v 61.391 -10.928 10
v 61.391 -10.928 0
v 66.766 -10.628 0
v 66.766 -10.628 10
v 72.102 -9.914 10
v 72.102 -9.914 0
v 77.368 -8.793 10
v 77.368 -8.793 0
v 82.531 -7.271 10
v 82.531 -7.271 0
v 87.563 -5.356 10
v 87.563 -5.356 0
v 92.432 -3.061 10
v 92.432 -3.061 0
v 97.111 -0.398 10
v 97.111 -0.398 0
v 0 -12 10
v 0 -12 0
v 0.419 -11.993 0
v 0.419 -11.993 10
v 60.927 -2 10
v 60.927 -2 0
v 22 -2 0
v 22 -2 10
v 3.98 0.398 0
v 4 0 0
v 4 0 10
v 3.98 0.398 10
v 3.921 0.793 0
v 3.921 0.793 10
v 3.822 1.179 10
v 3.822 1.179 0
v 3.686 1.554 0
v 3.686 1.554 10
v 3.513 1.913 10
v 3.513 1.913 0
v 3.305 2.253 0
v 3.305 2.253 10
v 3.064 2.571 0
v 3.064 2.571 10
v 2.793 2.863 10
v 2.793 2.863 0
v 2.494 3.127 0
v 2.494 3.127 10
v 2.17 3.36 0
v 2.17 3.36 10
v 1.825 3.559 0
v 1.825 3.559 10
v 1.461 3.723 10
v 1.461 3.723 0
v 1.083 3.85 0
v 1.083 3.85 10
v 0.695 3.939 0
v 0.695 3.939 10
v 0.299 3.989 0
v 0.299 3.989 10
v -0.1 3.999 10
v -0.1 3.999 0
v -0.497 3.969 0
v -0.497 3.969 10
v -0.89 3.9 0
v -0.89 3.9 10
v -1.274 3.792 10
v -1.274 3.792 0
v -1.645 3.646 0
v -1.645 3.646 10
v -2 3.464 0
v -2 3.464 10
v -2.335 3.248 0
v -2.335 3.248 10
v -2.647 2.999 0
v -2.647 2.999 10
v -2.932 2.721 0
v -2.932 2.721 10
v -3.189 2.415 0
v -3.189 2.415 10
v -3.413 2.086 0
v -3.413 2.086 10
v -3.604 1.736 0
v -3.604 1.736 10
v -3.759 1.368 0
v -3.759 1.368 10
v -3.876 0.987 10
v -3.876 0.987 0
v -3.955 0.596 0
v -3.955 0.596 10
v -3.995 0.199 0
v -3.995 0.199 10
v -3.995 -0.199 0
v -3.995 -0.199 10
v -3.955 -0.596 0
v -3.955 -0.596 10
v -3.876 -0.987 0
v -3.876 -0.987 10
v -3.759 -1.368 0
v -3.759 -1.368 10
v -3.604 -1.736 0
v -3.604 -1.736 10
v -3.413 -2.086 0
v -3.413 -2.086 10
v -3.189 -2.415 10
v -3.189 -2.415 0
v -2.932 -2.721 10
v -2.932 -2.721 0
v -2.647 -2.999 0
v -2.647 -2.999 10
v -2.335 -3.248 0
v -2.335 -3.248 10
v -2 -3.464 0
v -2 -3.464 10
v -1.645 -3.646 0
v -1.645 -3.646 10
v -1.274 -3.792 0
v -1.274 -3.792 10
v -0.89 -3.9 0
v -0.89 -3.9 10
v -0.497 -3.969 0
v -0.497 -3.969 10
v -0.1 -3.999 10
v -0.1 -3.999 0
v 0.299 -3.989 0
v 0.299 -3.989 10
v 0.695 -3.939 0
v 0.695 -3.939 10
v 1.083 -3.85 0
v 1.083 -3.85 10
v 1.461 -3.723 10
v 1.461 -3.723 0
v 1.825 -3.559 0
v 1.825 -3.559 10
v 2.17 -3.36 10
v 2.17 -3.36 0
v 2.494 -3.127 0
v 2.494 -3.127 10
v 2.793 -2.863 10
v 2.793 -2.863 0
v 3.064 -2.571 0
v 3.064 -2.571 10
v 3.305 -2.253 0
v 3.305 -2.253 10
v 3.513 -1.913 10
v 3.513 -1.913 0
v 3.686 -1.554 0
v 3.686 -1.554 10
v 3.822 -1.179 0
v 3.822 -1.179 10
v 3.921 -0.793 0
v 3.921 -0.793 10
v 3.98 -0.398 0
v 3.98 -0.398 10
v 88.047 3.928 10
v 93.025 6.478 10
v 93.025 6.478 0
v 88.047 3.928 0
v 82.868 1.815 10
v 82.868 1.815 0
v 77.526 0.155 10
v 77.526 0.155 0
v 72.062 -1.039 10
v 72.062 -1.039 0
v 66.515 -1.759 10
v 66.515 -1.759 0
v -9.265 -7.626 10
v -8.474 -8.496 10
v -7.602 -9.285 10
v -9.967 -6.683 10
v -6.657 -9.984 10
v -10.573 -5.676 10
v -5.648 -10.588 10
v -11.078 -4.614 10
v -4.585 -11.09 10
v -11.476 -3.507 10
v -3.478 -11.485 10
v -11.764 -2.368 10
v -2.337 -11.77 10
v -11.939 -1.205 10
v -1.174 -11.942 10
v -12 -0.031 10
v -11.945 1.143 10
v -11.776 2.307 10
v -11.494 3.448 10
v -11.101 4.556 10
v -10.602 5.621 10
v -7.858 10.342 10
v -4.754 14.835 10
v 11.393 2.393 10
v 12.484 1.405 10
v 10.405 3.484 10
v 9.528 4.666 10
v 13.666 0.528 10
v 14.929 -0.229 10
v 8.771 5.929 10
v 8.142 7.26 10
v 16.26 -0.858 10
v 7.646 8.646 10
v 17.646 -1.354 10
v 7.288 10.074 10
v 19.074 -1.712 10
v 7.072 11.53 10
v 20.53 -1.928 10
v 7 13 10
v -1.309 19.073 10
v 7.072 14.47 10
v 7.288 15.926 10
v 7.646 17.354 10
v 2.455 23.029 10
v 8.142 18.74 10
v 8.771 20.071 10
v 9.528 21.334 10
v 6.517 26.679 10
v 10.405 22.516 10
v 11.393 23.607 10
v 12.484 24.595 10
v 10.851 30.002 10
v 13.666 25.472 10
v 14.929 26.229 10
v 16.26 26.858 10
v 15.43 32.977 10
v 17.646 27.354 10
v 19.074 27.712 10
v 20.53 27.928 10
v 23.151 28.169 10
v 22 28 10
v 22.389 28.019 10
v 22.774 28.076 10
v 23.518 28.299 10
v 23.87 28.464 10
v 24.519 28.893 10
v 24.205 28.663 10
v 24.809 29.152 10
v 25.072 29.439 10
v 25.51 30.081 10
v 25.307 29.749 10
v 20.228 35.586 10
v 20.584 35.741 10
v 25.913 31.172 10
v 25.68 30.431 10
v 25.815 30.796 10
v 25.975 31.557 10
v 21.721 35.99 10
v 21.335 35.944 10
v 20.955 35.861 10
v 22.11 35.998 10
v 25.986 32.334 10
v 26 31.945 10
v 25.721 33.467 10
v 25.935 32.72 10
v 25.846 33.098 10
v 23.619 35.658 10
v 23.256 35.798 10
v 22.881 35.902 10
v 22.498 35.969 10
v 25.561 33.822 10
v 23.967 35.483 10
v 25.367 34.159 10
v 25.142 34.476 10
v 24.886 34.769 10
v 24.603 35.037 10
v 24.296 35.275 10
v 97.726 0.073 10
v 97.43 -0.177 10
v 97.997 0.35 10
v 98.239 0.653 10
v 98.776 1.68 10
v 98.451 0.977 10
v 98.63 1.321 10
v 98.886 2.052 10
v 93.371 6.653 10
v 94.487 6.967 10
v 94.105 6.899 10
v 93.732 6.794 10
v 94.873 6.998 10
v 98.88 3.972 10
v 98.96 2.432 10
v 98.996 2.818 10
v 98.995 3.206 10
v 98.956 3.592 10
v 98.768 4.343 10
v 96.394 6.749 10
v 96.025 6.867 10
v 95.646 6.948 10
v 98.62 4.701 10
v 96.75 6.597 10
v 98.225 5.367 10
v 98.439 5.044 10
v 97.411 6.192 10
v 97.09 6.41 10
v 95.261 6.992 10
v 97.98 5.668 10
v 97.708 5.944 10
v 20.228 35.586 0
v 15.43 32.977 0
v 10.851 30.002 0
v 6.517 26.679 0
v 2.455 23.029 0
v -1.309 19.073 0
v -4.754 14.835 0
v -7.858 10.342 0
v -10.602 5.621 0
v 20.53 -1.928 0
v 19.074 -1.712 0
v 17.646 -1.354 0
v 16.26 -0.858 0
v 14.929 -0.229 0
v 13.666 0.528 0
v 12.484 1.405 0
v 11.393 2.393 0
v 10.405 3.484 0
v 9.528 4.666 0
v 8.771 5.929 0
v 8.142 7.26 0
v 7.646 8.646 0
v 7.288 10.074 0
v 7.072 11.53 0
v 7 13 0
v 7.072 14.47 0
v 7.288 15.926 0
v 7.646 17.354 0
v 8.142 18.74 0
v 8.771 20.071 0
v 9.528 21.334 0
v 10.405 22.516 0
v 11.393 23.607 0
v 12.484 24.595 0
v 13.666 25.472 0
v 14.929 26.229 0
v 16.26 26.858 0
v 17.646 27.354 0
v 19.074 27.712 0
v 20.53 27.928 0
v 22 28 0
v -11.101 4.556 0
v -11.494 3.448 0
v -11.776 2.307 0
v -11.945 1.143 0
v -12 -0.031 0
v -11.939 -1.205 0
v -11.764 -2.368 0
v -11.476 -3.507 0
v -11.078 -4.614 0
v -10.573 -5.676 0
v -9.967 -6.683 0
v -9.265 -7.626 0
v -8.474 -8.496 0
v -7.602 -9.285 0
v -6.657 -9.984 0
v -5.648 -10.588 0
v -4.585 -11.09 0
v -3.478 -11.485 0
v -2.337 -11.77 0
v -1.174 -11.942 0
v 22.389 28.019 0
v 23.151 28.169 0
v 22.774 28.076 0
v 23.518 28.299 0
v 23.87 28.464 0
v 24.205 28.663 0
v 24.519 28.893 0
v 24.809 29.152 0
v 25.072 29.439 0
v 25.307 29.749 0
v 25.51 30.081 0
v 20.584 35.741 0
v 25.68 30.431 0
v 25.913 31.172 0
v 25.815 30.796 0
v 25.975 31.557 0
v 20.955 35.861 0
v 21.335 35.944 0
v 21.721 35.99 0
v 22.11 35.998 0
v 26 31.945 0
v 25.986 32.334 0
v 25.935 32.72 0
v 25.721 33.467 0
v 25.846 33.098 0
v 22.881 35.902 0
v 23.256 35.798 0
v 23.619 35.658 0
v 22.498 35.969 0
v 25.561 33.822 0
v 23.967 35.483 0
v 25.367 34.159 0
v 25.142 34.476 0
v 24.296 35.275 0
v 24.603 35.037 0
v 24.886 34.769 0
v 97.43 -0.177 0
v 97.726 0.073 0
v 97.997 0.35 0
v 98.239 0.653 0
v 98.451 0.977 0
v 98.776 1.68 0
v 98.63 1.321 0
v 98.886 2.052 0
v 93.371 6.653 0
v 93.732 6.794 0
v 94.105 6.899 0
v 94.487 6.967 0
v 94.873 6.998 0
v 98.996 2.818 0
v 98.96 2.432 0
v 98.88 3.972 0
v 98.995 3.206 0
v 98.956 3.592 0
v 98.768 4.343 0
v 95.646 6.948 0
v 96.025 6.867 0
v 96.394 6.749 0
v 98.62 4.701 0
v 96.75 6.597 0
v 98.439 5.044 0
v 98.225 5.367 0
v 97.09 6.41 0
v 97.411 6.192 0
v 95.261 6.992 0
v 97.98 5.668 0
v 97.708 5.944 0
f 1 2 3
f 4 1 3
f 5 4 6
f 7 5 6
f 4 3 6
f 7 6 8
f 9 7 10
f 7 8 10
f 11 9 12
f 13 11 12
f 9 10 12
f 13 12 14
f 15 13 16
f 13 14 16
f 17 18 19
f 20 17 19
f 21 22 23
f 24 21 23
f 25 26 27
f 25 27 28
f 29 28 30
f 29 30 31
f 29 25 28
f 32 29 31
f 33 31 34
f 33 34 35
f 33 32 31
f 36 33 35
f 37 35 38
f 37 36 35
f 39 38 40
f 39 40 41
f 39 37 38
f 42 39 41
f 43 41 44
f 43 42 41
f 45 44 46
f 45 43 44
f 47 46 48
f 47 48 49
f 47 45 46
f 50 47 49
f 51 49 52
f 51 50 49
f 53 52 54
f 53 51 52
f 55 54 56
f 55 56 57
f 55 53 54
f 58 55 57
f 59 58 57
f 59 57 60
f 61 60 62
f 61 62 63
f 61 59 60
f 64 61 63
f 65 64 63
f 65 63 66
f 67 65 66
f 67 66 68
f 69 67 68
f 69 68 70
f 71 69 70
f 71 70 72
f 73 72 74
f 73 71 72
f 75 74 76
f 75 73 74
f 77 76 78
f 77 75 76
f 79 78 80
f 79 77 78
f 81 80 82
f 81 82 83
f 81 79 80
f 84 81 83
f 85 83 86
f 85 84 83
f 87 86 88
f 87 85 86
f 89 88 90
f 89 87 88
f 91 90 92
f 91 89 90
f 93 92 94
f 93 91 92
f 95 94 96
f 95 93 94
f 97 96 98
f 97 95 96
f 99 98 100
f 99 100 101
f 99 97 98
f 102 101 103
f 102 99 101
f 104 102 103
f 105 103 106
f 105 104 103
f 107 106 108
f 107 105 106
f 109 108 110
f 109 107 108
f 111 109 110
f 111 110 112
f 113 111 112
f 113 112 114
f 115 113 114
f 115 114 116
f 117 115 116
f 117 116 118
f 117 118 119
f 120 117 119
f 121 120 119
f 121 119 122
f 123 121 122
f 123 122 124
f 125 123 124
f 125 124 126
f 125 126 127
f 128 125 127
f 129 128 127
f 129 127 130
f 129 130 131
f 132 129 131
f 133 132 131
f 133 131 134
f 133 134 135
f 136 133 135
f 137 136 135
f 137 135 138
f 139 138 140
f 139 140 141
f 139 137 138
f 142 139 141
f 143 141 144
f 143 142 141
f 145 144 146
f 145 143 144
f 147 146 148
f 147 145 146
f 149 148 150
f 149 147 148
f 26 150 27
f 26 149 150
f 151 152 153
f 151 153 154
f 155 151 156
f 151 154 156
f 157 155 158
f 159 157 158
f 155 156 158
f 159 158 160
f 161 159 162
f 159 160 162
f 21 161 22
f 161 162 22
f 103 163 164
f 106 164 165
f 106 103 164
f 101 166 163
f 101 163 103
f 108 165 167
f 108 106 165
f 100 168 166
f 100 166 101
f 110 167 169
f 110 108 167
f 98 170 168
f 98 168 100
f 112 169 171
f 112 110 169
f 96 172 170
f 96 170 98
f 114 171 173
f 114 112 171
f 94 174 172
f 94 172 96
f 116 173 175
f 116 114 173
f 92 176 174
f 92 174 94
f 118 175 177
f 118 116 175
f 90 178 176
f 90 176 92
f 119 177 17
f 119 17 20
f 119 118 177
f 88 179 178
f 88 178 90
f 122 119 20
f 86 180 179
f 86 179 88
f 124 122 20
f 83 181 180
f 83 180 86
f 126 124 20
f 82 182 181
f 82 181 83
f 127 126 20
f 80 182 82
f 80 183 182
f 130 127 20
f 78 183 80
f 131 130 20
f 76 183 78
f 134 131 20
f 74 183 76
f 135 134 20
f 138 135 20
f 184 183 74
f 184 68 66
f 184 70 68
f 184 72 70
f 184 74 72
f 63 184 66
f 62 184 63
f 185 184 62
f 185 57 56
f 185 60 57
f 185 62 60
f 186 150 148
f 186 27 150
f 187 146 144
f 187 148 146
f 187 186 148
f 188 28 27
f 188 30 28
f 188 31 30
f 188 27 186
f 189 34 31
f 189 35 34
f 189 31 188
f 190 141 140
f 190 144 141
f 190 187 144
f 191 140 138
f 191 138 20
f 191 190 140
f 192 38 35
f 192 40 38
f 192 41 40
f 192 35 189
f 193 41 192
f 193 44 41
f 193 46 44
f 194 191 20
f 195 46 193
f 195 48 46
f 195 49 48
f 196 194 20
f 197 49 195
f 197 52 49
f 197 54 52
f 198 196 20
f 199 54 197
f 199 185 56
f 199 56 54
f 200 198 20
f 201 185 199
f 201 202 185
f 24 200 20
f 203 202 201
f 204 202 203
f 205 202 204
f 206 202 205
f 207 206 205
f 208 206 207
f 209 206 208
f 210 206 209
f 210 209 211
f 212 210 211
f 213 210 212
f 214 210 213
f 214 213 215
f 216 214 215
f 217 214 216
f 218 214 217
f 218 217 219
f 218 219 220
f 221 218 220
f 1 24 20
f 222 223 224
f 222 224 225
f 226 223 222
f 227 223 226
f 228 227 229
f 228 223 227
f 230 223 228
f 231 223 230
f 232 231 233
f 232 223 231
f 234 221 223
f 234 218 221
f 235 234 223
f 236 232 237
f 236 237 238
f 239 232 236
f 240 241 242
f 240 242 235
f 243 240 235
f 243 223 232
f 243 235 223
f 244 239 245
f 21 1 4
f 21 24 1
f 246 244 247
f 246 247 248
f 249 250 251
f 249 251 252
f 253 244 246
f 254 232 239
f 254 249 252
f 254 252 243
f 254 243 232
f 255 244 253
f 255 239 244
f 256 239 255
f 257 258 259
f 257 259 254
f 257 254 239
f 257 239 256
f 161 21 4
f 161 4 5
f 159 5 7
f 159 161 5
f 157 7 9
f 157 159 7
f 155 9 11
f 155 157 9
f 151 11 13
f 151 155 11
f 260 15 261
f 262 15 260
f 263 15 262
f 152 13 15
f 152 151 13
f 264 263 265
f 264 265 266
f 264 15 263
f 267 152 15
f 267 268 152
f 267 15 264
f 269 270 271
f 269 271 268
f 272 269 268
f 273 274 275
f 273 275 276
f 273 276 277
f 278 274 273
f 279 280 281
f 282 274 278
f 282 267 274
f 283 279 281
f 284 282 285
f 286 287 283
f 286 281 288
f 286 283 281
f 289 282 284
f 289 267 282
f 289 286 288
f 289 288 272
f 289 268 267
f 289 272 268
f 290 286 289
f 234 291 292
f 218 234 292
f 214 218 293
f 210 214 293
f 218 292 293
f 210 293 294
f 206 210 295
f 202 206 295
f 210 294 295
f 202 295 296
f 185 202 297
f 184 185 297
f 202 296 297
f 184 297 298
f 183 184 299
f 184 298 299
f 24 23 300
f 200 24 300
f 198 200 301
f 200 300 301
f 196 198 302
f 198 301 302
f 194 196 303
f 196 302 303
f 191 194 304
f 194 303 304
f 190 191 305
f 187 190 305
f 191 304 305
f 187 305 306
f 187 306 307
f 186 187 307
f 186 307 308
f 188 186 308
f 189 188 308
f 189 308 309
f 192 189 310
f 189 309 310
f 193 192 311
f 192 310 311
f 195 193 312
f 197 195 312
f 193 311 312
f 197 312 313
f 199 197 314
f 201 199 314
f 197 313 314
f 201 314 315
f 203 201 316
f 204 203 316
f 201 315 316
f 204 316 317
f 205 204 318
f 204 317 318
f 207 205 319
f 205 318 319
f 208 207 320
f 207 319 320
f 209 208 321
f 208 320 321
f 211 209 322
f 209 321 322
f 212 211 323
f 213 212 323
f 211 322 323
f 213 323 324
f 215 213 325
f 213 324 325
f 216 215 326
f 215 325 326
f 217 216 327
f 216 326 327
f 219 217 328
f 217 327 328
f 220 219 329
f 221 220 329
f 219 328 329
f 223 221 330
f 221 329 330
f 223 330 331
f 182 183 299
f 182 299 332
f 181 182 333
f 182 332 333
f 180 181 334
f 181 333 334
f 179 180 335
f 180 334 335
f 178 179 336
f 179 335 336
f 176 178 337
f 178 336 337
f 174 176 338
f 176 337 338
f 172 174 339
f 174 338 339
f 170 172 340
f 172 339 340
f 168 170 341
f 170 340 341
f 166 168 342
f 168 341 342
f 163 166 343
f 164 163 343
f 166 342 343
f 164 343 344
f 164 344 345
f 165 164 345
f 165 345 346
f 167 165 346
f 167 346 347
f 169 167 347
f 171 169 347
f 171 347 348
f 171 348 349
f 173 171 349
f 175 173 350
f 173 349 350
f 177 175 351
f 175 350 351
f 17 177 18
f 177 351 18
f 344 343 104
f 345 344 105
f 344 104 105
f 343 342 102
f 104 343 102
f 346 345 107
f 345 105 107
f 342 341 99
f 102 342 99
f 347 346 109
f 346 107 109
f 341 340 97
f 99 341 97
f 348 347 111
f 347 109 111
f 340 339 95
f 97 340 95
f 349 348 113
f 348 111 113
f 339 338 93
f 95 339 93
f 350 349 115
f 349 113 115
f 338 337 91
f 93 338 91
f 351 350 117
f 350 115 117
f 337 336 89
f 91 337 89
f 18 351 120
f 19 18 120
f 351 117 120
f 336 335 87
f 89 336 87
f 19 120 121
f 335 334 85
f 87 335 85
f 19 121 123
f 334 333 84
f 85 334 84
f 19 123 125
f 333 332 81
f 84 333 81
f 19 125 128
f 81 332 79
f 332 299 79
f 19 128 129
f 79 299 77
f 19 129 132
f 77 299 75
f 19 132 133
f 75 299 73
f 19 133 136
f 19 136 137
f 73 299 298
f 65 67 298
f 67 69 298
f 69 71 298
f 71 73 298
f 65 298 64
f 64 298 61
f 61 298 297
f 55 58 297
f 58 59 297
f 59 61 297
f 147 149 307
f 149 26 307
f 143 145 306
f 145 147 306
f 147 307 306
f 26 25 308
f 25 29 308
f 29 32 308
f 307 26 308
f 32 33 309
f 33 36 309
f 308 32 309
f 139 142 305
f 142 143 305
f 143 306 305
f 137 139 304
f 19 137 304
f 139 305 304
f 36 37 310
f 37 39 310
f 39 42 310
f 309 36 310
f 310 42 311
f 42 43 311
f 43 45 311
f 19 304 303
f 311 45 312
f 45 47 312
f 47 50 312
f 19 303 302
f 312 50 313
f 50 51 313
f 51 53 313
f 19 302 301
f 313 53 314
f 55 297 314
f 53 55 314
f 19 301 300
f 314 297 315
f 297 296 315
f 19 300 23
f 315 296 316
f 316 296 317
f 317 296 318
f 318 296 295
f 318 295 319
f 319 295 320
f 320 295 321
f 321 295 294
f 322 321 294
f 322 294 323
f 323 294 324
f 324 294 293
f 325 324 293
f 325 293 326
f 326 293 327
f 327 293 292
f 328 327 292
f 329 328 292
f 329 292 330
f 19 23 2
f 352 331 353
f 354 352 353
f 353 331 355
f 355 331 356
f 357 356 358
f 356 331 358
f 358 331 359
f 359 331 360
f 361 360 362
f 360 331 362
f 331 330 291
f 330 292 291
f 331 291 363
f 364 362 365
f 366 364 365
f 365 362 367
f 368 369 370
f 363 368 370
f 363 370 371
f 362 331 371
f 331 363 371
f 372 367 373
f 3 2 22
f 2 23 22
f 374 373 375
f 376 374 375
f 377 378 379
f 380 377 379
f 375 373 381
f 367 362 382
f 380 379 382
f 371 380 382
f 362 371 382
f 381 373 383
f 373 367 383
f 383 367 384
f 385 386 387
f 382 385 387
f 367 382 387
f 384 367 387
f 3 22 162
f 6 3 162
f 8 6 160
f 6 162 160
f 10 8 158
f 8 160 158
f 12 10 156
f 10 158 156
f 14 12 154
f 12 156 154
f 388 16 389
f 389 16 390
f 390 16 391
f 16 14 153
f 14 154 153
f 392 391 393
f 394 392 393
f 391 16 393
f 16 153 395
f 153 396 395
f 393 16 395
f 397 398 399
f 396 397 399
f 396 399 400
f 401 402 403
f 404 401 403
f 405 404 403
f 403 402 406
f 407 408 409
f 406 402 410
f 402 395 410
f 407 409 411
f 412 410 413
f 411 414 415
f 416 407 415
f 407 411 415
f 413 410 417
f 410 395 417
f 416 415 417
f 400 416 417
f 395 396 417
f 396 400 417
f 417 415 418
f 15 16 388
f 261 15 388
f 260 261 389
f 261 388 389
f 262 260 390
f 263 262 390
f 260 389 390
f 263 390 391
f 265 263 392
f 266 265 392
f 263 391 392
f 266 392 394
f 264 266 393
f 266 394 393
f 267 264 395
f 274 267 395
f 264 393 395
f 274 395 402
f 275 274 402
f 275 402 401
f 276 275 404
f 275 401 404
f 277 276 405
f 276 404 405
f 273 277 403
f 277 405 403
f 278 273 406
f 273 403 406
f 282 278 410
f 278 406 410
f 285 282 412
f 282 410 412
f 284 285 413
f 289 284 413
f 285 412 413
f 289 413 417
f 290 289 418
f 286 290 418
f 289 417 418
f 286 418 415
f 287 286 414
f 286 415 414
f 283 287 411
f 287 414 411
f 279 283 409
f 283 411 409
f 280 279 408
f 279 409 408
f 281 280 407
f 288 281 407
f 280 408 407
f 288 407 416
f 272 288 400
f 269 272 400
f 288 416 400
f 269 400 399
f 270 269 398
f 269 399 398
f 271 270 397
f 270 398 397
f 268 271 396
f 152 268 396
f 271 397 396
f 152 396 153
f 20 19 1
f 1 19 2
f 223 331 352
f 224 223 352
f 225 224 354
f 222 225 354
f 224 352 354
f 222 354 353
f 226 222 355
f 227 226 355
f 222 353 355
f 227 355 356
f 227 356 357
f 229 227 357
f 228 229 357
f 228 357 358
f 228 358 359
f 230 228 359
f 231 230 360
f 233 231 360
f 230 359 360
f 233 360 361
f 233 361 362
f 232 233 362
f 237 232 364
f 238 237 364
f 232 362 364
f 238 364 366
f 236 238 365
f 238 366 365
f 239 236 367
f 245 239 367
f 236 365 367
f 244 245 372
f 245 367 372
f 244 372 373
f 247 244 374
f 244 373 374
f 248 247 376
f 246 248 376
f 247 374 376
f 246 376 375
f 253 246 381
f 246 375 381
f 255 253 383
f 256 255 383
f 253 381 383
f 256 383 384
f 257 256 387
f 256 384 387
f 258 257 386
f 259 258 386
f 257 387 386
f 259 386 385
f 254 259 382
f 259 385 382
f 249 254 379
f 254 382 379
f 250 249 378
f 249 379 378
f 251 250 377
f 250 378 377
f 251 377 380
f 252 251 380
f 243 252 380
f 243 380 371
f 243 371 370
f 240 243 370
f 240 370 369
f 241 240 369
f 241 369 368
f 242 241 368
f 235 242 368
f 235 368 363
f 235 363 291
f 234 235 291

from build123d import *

# Parameters (mm, degrees)
SKETCH1_R           = 4
BOSS_EXTRUDE1_DEPTH = 10


with BuildPart() as part:
    # Sketch1 → Boss-Extrude1 (new body)
    with BuildSketch(Plane.XY):
        with BuildLine():
            ThreePointArc((-10.602156333, 5.620879031), (-10.28227962, -6.186657079), (0, -12))
            Line((0, -12), (0.41879396, -11.992689924))
            Line((0.41879396, -11.992689924), (61.391036956, -10.928415464))
            ThreePointArc((61.391036956, -10.928415464), (79.964133291, -8.081963895), (97.110947363, -0.397631709))
            ThreePointArc((97.110947363, -0.397631709), (98.438615507, 5.04350762), (93.024727532, 6.47826087))
            ThreePointArc((93.024727532, 6.47826087), (77.526052275, 0.15529838), (60.926549925, -2))
            Line((60.926549925, -2), (22, -2))
            ThreePointArc((22, -2), (7, 13), (22, 28))
            ThreePointArc((22, 28), (25.895103095, 32.910039494), (20.227651175, 35.58591406))
            ThreePointArc((20.227651175, 35.58591406), (2.455290247, 23.028888484), (-10.602156333, 5.620879031))
        make_face()
        Circle(SKETCH1_R, mode=Mode.SUBTRACT)
    extrude(amount=BOSS_EXTRUDE1_DEPTH)


solid = part.part
